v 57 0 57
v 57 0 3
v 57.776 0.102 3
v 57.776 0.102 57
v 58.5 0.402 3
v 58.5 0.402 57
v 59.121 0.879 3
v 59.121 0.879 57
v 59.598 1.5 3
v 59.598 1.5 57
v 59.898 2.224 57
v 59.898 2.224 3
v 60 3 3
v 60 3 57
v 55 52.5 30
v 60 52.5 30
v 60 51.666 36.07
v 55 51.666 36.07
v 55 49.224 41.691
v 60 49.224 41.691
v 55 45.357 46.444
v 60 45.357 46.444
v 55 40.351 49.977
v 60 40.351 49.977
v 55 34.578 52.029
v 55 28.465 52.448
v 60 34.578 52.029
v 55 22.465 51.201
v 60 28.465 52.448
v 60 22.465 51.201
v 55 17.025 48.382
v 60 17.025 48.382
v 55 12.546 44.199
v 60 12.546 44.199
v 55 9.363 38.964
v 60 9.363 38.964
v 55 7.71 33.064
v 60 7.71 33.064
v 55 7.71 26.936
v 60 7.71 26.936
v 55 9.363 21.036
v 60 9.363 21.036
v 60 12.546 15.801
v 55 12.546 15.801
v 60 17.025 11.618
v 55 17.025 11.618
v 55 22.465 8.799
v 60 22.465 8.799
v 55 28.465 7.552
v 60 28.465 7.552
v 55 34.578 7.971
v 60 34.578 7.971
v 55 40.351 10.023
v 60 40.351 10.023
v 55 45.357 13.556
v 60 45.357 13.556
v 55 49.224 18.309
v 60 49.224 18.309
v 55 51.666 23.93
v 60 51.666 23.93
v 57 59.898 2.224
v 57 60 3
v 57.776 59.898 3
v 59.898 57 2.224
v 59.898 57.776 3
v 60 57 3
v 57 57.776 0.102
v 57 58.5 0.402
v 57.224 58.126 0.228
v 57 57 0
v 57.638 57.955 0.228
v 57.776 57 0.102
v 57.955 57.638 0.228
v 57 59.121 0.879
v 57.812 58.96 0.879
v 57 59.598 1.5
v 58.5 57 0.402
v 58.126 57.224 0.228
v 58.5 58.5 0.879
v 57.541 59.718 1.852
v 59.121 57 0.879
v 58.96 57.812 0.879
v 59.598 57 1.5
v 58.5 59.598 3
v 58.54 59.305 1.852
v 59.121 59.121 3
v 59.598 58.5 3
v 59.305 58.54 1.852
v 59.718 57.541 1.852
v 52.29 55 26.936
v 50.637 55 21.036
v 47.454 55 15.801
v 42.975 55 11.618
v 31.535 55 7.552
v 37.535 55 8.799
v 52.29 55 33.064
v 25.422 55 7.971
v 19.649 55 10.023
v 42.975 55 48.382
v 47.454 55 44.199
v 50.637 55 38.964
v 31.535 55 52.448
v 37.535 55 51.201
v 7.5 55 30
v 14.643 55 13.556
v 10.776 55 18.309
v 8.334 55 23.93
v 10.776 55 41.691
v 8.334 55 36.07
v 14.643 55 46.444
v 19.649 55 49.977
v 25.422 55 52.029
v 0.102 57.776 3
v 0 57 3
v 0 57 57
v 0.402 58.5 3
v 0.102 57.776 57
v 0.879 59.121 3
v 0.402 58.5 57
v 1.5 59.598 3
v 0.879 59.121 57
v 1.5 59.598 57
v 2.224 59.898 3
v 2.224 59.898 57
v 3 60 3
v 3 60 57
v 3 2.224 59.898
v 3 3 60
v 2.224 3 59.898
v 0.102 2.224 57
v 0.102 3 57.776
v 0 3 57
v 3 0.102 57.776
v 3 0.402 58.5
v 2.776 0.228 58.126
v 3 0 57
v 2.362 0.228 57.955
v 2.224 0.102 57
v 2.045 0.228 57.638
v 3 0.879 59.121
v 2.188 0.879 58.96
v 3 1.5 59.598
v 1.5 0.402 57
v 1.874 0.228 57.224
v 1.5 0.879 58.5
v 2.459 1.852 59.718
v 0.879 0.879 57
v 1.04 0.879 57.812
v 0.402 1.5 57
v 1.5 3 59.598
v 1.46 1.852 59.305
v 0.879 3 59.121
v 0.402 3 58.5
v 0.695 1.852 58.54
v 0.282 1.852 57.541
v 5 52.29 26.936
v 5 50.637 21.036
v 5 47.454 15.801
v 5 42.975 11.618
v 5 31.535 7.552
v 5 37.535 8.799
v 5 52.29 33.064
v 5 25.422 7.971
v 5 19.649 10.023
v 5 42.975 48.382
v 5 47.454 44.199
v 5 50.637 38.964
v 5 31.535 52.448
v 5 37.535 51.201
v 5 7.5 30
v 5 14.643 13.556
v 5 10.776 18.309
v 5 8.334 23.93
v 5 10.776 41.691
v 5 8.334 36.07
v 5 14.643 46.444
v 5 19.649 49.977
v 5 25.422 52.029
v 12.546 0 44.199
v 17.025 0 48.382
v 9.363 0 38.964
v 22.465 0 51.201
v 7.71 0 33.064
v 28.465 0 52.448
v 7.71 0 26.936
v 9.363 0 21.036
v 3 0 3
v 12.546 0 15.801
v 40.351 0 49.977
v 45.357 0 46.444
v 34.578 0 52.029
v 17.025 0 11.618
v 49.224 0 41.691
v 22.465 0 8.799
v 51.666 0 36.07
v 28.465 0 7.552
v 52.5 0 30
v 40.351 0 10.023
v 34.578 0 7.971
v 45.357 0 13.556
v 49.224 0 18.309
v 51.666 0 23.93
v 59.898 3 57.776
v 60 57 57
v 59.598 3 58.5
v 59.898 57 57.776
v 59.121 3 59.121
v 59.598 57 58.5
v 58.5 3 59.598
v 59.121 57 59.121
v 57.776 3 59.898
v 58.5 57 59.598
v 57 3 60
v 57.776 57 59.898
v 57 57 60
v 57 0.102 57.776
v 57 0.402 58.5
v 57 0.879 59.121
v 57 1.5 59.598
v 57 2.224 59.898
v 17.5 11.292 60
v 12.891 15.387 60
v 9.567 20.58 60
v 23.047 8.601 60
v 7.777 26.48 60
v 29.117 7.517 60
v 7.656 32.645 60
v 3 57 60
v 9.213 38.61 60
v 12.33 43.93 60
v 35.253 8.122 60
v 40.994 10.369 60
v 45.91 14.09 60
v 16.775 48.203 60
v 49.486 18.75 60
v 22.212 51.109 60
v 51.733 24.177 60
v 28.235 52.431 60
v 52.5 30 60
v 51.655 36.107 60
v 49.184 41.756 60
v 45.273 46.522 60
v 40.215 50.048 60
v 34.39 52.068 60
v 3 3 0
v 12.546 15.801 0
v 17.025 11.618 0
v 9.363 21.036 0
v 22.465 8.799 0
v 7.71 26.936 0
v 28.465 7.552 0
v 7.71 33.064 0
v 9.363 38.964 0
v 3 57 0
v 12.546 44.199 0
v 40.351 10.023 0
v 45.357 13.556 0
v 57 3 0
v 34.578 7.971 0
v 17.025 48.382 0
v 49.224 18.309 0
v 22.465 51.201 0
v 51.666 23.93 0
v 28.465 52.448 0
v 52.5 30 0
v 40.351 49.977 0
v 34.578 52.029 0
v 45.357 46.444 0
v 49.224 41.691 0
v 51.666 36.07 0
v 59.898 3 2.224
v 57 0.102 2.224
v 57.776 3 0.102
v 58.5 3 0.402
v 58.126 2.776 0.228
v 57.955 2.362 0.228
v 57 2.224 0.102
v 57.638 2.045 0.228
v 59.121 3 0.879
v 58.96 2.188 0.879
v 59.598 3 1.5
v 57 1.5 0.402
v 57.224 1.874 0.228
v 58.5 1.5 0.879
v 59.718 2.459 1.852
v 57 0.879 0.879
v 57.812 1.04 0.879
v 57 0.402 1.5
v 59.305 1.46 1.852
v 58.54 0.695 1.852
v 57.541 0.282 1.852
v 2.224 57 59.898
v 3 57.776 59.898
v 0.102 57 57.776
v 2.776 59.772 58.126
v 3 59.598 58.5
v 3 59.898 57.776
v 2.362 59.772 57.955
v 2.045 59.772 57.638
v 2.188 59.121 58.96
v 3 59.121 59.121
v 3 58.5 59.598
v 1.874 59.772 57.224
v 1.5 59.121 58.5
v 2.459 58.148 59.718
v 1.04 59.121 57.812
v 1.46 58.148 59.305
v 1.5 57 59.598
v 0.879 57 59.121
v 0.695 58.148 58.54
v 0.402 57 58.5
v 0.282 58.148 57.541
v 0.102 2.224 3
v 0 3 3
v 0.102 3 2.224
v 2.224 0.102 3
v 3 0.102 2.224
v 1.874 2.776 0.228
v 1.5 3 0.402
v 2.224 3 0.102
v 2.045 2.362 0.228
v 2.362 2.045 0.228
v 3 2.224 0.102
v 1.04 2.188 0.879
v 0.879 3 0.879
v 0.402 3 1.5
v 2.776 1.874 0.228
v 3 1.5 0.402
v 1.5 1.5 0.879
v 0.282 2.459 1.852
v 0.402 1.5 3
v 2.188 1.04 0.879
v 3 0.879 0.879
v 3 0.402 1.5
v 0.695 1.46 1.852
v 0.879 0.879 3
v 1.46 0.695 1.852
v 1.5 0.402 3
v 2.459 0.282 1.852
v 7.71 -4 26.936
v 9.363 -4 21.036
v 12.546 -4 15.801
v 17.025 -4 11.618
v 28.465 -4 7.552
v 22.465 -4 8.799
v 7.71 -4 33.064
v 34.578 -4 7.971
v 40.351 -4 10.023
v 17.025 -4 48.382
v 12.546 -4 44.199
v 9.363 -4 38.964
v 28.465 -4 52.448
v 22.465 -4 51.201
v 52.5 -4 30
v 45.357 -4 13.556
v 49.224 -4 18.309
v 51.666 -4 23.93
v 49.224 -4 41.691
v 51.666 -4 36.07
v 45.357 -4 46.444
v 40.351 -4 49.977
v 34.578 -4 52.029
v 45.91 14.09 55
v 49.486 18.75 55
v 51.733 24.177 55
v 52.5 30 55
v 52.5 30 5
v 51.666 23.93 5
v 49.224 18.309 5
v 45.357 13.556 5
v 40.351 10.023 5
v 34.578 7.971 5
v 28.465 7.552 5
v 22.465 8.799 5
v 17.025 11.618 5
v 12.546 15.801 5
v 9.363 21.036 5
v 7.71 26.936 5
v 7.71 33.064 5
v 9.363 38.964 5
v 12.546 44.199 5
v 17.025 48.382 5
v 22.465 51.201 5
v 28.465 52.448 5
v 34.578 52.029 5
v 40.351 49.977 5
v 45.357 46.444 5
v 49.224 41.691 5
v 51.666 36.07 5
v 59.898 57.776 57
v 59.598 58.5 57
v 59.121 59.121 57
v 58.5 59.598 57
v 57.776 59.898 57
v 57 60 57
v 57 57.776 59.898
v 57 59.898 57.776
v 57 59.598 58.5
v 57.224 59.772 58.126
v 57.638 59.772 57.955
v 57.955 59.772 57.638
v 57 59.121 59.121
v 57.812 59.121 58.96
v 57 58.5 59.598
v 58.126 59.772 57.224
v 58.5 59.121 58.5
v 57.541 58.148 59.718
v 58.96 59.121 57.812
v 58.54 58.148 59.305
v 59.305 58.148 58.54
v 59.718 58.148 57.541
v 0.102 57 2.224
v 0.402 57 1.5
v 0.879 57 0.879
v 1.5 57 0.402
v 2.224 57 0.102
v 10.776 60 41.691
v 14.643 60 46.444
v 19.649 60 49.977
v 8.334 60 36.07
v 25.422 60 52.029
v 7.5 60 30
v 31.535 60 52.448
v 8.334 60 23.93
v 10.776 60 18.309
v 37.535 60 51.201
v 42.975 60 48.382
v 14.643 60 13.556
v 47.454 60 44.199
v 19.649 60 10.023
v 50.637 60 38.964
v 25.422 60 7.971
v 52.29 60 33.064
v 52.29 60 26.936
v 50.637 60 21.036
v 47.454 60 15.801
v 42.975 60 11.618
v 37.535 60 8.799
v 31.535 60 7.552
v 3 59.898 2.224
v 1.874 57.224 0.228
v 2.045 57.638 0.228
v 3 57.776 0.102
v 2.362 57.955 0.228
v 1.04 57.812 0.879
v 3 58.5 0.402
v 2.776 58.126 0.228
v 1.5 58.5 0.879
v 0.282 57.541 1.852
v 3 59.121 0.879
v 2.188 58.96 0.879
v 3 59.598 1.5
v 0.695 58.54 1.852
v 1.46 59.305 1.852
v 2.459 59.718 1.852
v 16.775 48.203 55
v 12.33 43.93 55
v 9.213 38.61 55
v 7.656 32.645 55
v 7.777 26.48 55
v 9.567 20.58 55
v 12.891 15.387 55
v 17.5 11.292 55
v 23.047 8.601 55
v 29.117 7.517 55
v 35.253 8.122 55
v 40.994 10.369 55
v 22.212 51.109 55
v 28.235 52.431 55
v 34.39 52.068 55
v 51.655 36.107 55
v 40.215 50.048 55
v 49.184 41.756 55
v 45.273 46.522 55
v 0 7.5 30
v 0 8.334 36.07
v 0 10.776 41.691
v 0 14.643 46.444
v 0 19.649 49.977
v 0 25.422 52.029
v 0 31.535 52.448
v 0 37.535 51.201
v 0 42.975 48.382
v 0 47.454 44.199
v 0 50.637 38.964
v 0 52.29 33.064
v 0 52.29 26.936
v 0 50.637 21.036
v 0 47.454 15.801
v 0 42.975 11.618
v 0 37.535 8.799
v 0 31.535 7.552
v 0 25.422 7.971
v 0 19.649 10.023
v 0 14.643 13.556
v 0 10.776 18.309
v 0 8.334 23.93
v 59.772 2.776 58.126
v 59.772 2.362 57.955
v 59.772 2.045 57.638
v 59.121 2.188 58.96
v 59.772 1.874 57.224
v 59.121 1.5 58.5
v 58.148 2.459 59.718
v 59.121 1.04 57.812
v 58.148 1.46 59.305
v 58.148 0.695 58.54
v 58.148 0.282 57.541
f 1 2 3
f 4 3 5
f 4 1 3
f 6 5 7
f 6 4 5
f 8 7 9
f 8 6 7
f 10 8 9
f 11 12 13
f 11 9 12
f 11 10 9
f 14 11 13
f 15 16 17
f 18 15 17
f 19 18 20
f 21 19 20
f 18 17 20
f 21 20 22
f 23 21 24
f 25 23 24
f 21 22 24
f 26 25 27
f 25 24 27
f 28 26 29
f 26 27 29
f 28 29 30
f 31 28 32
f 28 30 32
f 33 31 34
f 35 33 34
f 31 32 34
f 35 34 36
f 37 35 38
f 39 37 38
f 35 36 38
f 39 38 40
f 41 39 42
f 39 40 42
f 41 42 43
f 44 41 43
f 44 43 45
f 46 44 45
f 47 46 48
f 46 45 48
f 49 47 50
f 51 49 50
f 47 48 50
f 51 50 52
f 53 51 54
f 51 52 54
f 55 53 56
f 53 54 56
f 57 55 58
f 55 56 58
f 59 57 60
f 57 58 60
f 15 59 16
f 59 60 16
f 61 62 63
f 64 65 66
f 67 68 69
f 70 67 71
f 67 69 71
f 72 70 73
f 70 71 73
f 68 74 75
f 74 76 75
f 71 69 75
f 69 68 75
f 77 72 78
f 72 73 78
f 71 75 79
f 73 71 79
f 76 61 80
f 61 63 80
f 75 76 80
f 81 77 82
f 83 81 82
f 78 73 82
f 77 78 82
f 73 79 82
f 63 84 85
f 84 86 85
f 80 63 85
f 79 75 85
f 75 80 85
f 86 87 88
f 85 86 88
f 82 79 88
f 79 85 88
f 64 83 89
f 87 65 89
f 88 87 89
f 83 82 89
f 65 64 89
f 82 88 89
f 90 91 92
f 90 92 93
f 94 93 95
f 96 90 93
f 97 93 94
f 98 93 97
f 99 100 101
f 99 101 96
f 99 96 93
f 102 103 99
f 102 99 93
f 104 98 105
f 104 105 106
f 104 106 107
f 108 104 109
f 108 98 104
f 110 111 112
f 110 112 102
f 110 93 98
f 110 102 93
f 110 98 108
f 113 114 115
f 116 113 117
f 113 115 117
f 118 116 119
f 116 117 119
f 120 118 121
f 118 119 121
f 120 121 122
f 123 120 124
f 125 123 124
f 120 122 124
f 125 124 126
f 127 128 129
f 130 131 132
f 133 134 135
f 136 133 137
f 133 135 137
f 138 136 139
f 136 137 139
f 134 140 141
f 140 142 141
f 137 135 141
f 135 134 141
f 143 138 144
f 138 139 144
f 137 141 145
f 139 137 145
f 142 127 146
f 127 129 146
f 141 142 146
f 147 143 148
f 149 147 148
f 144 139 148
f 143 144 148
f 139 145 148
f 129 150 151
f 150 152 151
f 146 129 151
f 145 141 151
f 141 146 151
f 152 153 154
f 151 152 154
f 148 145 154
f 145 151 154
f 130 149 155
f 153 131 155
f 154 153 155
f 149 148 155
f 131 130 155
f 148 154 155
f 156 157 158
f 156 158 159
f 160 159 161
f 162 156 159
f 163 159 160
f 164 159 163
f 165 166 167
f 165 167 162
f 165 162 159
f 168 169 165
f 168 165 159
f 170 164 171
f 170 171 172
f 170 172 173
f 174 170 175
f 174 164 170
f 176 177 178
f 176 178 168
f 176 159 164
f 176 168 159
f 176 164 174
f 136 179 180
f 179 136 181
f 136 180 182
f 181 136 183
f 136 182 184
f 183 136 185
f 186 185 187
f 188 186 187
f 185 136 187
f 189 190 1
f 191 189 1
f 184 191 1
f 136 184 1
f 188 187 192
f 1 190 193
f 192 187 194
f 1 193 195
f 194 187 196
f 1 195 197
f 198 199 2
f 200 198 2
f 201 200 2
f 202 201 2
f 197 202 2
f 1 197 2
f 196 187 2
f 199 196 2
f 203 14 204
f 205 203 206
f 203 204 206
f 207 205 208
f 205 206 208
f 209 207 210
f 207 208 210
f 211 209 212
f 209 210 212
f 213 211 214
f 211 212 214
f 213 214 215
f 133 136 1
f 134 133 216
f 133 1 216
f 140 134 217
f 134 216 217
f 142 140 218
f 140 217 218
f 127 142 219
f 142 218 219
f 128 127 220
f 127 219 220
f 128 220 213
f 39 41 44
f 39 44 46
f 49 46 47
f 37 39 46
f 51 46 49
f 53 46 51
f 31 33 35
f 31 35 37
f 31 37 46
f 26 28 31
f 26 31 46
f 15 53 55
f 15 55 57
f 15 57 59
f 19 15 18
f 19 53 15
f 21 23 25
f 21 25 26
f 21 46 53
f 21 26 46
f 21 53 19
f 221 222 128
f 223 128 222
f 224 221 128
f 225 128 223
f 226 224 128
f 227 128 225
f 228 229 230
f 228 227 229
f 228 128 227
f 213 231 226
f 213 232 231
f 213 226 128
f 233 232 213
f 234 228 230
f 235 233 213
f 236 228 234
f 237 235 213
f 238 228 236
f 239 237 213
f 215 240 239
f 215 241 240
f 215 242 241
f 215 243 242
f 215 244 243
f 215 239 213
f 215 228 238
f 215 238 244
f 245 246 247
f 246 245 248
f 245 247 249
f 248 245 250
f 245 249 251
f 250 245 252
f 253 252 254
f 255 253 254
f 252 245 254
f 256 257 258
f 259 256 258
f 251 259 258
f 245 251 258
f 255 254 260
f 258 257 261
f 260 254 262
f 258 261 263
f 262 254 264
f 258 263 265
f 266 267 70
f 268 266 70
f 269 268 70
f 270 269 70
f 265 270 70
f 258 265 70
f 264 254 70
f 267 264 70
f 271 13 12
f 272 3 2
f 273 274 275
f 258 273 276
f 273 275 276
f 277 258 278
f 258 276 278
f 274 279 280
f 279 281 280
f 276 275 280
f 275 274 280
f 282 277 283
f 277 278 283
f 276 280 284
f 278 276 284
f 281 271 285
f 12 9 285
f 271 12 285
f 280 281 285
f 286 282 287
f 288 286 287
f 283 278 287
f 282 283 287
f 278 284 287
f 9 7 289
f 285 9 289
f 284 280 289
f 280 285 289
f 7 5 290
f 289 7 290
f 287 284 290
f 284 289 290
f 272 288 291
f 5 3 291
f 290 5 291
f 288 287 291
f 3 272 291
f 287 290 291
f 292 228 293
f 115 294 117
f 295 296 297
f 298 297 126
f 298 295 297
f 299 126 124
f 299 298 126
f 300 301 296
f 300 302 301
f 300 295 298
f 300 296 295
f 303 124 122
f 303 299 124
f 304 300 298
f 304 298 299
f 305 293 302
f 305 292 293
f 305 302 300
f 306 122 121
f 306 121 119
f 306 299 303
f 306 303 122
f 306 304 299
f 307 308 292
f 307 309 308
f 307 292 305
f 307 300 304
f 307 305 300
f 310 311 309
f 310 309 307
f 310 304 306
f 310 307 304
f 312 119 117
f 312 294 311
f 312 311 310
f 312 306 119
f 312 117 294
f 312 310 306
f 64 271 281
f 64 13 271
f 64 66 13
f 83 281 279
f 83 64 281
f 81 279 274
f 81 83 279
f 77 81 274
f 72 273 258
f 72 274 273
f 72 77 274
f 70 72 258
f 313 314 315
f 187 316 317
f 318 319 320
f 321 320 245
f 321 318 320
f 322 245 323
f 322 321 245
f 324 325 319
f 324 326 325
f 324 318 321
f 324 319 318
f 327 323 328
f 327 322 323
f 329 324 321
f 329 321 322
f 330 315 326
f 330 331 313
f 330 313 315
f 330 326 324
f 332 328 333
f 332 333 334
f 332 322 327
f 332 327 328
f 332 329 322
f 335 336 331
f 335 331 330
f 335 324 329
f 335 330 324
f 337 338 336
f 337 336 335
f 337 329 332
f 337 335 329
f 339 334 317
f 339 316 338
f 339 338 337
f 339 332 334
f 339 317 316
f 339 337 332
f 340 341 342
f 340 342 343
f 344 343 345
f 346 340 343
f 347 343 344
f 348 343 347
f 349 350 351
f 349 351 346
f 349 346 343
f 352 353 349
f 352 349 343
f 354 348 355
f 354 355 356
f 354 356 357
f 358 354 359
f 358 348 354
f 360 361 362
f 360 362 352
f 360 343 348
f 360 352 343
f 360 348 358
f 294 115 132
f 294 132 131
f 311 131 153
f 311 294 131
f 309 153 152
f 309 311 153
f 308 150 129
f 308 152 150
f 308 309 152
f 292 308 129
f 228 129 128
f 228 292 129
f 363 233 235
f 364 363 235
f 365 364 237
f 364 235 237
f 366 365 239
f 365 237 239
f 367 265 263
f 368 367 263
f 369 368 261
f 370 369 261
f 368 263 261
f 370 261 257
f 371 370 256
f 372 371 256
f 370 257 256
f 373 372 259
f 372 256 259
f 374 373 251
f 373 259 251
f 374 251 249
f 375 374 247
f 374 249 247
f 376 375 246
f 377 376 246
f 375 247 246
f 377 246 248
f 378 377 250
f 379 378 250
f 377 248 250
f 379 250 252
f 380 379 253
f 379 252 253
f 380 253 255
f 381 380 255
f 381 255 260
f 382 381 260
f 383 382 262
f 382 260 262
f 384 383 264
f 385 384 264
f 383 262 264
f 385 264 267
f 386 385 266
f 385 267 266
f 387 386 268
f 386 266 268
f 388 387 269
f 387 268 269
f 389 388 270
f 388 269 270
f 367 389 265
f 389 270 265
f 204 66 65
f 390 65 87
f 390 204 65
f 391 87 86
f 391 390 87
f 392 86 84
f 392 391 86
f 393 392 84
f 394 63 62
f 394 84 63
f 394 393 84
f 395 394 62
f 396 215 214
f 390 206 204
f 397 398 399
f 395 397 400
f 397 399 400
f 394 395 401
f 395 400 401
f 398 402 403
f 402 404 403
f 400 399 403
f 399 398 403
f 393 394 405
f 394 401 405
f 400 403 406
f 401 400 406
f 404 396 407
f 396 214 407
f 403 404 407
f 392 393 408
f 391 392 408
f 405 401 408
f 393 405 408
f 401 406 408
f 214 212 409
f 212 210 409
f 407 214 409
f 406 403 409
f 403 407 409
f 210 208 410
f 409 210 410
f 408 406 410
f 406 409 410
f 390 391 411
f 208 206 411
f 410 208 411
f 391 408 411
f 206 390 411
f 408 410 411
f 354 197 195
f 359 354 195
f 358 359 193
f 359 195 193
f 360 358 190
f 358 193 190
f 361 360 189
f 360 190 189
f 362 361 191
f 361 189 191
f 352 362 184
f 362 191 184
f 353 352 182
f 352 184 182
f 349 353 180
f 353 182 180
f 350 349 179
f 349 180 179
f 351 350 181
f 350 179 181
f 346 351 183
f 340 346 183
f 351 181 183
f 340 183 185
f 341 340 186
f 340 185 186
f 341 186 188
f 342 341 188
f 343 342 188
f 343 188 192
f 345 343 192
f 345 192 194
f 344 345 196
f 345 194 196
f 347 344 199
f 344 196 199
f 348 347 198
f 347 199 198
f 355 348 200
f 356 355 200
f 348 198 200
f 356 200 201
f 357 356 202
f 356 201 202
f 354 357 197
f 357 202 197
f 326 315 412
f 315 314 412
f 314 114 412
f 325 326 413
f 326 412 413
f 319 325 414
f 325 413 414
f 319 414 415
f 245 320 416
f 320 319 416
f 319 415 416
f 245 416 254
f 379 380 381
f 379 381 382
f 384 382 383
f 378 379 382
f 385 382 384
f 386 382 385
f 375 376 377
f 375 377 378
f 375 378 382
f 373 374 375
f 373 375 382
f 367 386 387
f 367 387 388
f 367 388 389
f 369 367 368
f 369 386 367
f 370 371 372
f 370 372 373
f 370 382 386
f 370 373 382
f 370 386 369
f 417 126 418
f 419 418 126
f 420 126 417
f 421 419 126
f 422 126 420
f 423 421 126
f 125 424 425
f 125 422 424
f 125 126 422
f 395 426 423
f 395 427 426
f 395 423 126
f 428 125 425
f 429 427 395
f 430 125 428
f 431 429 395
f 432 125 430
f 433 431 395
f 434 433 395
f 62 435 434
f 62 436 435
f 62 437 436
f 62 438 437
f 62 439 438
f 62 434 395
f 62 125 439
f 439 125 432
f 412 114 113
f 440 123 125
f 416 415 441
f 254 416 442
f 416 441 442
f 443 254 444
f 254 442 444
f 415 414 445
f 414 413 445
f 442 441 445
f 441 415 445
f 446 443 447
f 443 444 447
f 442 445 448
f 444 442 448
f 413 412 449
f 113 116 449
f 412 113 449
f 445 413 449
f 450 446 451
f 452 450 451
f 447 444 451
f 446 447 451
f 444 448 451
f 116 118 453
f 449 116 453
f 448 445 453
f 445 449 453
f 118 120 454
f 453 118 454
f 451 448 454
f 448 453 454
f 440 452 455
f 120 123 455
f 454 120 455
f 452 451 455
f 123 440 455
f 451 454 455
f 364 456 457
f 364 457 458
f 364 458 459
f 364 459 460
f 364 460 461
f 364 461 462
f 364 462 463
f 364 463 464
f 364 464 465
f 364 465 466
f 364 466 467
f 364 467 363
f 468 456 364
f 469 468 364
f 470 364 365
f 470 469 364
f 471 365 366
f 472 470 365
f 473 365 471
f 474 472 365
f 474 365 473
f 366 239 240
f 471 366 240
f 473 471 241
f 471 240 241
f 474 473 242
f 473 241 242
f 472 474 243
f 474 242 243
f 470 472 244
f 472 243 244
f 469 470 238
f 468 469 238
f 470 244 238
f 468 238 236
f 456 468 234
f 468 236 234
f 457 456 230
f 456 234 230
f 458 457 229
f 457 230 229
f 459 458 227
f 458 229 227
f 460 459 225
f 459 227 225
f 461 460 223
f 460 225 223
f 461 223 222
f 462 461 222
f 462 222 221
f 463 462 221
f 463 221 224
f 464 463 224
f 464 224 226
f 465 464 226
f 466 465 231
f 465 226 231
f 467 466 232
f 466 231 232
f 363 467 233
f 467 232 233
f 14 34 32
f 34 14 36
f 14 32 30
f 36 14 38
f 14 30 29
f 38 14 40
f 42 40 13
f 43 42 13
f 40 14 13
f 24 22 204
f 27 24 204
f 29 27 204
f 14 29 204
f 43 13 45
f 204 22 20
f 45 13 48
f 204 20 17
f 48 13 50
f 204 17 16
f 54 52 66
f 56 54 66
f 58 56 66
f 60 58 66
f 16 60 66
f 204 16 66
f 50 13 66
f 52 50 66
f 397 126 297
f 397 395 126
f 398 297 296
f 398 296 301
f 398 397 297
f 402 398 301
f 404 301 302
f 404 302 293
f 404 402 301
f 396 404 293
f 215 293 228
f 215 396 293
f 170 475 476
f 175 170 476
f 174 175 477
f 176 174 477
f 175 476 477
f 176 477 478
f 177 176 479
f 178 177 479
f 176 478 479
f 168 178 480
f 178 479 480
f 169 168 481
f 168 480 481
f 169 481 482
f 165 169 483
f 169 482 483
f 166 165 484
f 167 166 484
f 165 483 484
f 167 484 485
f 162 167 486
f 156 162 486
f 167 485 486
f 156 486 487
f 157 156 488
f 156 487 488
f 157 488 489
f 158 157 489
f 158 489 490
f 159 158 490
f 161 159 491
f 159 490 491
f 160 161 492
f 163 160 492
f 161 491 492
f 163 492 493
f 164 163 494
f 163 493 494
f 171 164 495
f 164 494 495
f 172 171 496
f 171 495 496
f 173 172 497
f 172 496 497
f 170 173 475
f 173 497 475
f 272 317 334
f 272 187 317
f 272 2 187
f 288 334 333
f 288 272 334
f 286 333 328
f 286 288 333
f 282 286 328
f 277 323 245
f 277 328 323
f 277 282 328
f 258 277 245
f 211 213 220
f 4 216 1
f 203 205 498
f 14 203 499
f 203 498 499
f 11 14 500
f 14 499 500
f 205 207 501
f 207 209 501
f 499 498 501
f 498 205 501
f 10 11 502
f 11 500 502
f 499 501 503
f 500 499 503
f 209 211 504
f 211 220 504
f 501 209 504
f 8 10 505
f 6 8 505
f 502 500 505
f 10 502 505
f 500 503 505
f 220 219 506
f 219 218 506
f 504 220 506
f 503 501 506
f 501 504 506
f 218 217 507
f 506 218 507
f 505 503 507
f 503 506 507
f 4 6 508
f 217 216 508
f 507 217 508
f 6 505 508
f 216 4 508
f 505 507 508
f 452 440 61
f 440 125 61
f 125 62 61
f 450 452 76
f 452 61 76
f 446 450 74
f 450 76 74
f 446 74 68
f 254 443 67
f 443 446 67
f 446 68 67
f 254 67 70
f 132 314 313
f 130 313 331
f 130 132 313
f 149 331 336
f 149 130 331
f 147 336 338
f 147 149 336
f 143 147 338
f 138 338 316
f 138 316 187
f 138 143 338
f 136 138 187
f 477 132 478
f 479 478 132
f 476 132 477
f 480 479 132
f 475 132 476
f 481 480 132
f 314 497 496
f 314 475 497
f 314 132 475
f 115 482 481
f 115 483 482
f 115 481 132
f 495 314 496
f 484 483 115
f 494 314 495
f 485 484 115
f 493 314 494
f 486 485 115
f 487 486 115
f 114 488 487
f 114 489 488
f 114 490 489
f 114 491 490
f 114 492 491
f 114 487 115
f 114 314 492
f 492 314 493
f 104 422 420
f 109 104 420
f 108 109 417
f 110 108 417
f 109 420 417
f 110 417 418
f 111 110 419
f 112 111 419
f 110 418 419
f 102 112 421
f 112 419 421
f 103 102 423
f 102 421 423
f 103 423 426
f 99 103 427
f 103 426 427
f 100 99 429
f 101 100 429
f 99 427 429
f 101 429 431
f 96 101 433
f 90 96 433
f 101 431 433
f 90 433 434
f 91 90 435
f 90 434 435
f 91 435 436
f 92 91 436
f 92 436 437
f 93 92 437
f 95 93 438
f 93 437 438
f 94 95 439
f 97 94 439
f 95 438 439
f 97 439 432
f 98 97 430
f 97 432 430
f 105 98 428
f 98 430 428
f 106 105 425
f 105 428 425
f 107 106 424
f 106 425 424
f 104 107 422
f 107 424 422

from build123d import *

# Parameters (mm, degrees)
F0_W      = 60
F0_H      = 60
F1_DEPTH  = 60
F2_R      = 3
F4_DEPTH  = 5
F5_R      = 22.5
F6_DEPTH  = 5
F7_R      = 22.5
F8_DEPTH  = 4
F9_R      = 22.5
F10_DEPTH = 5
F11_R     = 22.5
F12_DEPTH = 5
F13_R     = 22.5
F14_DEPTH = 5


with BuildPart() as f1:
    # F0 (on Top) → F1 (new body)
    with BuildSketch(Plane.XY):
        with Locations((30, 30)):
            Rectangle(F0_W, F0_H)
    extrude(amount=F1_DEPTH)

    # F2
    f2_edges = [f1.edges().sort_by_distance(p)[0] for p in [
        (0, 30, 60),
        (30, 0, 60),
        (60, 30, 60),
        (30, 60, 60),
        (0, 60, 30),
        (0, 0, 30),
        (0, 30, 0),
        (60, 60, 30),
        (30, 60, 0),
        (60, 0, 30),
        (60, 30, 0),
        (30, 0, 0),
    ]]
    fillet(f2_edges, radius=F2_R)

    # F3 (on face) → F4 (cut)
    with BuildSketch(Plane.XY.offset(60)):
        with BuildLine():
            ThreePointArc((52.5, 30), (38.6103772282, 50.7872894815), (14.0900974233, 45.9099025767))
            Line((14.0900974233, 45.9099025767), (45.9099025767, 14.0900974233))
            ThreePointArc((45.9099025767, 14.0900974233), (50.7872894815, 21.3896227718), (52.5, 30))
        make_face()
        with BuildLine():
            Line((45.9099025767, 14.0900974233), (14.0900974233, 45.9099025767))
            ThreePointArc((14.0900974233, 45.9099025767), (14.0900974233, 14.0900974233), (45.9099025767, 14.0900974233))
        make_face()
    extrude(amount=-F4_DEPTH, mode=Mode.SUBTRACT)

    # F5 (on face) → F6 (cut)
    with BuildSketch(Plane.YZ.offset(60)):
        with Locations((30, 30)):
            Circle(F5_R)
    extrude(amount=-F6_DEPTH, mode=Mode.SUBTRACT)

    # F7 (on face) → F8 (join)
    with BuildSketch(Plane.XZ):
        with Locations((30, 30)):
            Circle(F7_R)
    extrude(amount=F8_DEPTH)

    # F9 (on face) → F10 (cut)
    with BuildSketch(Plane(origin=(0, 60, 0), x_dir=(-1, 0, 0), z_dir=(0, 1, 0))):
        with Locations((-30, 30)):
            Circle(F9_R)
    extrude(amount=-F10_DEPTH, mode=Mode.SUBTRACT)

    # F11 (on face) → F12 (cut)
    with BuildSketch(Plane(origin=(0, 0, 0), x_dir=(0, -1, 0), z_dir=(-1, 0, 0))):
        with Locations((-30, 30)):
            Circle(F11_R)
    extrude(amount=-F12_DEPTH, mode=Mode.SUBTRACT)

    # F13 (on face) → F14 (cut)
    with BuildSketch(Plane(origin=(0, 0, 0), x_dir=(1, 0, 0), z_dir=(0, 0, -1))):
        with Locations((30, -30)):
            Circle(F13_R)
    extrude(amount=-F14_DEPTH, mode=Mode.SUBTRACT)


solid = f1.part
